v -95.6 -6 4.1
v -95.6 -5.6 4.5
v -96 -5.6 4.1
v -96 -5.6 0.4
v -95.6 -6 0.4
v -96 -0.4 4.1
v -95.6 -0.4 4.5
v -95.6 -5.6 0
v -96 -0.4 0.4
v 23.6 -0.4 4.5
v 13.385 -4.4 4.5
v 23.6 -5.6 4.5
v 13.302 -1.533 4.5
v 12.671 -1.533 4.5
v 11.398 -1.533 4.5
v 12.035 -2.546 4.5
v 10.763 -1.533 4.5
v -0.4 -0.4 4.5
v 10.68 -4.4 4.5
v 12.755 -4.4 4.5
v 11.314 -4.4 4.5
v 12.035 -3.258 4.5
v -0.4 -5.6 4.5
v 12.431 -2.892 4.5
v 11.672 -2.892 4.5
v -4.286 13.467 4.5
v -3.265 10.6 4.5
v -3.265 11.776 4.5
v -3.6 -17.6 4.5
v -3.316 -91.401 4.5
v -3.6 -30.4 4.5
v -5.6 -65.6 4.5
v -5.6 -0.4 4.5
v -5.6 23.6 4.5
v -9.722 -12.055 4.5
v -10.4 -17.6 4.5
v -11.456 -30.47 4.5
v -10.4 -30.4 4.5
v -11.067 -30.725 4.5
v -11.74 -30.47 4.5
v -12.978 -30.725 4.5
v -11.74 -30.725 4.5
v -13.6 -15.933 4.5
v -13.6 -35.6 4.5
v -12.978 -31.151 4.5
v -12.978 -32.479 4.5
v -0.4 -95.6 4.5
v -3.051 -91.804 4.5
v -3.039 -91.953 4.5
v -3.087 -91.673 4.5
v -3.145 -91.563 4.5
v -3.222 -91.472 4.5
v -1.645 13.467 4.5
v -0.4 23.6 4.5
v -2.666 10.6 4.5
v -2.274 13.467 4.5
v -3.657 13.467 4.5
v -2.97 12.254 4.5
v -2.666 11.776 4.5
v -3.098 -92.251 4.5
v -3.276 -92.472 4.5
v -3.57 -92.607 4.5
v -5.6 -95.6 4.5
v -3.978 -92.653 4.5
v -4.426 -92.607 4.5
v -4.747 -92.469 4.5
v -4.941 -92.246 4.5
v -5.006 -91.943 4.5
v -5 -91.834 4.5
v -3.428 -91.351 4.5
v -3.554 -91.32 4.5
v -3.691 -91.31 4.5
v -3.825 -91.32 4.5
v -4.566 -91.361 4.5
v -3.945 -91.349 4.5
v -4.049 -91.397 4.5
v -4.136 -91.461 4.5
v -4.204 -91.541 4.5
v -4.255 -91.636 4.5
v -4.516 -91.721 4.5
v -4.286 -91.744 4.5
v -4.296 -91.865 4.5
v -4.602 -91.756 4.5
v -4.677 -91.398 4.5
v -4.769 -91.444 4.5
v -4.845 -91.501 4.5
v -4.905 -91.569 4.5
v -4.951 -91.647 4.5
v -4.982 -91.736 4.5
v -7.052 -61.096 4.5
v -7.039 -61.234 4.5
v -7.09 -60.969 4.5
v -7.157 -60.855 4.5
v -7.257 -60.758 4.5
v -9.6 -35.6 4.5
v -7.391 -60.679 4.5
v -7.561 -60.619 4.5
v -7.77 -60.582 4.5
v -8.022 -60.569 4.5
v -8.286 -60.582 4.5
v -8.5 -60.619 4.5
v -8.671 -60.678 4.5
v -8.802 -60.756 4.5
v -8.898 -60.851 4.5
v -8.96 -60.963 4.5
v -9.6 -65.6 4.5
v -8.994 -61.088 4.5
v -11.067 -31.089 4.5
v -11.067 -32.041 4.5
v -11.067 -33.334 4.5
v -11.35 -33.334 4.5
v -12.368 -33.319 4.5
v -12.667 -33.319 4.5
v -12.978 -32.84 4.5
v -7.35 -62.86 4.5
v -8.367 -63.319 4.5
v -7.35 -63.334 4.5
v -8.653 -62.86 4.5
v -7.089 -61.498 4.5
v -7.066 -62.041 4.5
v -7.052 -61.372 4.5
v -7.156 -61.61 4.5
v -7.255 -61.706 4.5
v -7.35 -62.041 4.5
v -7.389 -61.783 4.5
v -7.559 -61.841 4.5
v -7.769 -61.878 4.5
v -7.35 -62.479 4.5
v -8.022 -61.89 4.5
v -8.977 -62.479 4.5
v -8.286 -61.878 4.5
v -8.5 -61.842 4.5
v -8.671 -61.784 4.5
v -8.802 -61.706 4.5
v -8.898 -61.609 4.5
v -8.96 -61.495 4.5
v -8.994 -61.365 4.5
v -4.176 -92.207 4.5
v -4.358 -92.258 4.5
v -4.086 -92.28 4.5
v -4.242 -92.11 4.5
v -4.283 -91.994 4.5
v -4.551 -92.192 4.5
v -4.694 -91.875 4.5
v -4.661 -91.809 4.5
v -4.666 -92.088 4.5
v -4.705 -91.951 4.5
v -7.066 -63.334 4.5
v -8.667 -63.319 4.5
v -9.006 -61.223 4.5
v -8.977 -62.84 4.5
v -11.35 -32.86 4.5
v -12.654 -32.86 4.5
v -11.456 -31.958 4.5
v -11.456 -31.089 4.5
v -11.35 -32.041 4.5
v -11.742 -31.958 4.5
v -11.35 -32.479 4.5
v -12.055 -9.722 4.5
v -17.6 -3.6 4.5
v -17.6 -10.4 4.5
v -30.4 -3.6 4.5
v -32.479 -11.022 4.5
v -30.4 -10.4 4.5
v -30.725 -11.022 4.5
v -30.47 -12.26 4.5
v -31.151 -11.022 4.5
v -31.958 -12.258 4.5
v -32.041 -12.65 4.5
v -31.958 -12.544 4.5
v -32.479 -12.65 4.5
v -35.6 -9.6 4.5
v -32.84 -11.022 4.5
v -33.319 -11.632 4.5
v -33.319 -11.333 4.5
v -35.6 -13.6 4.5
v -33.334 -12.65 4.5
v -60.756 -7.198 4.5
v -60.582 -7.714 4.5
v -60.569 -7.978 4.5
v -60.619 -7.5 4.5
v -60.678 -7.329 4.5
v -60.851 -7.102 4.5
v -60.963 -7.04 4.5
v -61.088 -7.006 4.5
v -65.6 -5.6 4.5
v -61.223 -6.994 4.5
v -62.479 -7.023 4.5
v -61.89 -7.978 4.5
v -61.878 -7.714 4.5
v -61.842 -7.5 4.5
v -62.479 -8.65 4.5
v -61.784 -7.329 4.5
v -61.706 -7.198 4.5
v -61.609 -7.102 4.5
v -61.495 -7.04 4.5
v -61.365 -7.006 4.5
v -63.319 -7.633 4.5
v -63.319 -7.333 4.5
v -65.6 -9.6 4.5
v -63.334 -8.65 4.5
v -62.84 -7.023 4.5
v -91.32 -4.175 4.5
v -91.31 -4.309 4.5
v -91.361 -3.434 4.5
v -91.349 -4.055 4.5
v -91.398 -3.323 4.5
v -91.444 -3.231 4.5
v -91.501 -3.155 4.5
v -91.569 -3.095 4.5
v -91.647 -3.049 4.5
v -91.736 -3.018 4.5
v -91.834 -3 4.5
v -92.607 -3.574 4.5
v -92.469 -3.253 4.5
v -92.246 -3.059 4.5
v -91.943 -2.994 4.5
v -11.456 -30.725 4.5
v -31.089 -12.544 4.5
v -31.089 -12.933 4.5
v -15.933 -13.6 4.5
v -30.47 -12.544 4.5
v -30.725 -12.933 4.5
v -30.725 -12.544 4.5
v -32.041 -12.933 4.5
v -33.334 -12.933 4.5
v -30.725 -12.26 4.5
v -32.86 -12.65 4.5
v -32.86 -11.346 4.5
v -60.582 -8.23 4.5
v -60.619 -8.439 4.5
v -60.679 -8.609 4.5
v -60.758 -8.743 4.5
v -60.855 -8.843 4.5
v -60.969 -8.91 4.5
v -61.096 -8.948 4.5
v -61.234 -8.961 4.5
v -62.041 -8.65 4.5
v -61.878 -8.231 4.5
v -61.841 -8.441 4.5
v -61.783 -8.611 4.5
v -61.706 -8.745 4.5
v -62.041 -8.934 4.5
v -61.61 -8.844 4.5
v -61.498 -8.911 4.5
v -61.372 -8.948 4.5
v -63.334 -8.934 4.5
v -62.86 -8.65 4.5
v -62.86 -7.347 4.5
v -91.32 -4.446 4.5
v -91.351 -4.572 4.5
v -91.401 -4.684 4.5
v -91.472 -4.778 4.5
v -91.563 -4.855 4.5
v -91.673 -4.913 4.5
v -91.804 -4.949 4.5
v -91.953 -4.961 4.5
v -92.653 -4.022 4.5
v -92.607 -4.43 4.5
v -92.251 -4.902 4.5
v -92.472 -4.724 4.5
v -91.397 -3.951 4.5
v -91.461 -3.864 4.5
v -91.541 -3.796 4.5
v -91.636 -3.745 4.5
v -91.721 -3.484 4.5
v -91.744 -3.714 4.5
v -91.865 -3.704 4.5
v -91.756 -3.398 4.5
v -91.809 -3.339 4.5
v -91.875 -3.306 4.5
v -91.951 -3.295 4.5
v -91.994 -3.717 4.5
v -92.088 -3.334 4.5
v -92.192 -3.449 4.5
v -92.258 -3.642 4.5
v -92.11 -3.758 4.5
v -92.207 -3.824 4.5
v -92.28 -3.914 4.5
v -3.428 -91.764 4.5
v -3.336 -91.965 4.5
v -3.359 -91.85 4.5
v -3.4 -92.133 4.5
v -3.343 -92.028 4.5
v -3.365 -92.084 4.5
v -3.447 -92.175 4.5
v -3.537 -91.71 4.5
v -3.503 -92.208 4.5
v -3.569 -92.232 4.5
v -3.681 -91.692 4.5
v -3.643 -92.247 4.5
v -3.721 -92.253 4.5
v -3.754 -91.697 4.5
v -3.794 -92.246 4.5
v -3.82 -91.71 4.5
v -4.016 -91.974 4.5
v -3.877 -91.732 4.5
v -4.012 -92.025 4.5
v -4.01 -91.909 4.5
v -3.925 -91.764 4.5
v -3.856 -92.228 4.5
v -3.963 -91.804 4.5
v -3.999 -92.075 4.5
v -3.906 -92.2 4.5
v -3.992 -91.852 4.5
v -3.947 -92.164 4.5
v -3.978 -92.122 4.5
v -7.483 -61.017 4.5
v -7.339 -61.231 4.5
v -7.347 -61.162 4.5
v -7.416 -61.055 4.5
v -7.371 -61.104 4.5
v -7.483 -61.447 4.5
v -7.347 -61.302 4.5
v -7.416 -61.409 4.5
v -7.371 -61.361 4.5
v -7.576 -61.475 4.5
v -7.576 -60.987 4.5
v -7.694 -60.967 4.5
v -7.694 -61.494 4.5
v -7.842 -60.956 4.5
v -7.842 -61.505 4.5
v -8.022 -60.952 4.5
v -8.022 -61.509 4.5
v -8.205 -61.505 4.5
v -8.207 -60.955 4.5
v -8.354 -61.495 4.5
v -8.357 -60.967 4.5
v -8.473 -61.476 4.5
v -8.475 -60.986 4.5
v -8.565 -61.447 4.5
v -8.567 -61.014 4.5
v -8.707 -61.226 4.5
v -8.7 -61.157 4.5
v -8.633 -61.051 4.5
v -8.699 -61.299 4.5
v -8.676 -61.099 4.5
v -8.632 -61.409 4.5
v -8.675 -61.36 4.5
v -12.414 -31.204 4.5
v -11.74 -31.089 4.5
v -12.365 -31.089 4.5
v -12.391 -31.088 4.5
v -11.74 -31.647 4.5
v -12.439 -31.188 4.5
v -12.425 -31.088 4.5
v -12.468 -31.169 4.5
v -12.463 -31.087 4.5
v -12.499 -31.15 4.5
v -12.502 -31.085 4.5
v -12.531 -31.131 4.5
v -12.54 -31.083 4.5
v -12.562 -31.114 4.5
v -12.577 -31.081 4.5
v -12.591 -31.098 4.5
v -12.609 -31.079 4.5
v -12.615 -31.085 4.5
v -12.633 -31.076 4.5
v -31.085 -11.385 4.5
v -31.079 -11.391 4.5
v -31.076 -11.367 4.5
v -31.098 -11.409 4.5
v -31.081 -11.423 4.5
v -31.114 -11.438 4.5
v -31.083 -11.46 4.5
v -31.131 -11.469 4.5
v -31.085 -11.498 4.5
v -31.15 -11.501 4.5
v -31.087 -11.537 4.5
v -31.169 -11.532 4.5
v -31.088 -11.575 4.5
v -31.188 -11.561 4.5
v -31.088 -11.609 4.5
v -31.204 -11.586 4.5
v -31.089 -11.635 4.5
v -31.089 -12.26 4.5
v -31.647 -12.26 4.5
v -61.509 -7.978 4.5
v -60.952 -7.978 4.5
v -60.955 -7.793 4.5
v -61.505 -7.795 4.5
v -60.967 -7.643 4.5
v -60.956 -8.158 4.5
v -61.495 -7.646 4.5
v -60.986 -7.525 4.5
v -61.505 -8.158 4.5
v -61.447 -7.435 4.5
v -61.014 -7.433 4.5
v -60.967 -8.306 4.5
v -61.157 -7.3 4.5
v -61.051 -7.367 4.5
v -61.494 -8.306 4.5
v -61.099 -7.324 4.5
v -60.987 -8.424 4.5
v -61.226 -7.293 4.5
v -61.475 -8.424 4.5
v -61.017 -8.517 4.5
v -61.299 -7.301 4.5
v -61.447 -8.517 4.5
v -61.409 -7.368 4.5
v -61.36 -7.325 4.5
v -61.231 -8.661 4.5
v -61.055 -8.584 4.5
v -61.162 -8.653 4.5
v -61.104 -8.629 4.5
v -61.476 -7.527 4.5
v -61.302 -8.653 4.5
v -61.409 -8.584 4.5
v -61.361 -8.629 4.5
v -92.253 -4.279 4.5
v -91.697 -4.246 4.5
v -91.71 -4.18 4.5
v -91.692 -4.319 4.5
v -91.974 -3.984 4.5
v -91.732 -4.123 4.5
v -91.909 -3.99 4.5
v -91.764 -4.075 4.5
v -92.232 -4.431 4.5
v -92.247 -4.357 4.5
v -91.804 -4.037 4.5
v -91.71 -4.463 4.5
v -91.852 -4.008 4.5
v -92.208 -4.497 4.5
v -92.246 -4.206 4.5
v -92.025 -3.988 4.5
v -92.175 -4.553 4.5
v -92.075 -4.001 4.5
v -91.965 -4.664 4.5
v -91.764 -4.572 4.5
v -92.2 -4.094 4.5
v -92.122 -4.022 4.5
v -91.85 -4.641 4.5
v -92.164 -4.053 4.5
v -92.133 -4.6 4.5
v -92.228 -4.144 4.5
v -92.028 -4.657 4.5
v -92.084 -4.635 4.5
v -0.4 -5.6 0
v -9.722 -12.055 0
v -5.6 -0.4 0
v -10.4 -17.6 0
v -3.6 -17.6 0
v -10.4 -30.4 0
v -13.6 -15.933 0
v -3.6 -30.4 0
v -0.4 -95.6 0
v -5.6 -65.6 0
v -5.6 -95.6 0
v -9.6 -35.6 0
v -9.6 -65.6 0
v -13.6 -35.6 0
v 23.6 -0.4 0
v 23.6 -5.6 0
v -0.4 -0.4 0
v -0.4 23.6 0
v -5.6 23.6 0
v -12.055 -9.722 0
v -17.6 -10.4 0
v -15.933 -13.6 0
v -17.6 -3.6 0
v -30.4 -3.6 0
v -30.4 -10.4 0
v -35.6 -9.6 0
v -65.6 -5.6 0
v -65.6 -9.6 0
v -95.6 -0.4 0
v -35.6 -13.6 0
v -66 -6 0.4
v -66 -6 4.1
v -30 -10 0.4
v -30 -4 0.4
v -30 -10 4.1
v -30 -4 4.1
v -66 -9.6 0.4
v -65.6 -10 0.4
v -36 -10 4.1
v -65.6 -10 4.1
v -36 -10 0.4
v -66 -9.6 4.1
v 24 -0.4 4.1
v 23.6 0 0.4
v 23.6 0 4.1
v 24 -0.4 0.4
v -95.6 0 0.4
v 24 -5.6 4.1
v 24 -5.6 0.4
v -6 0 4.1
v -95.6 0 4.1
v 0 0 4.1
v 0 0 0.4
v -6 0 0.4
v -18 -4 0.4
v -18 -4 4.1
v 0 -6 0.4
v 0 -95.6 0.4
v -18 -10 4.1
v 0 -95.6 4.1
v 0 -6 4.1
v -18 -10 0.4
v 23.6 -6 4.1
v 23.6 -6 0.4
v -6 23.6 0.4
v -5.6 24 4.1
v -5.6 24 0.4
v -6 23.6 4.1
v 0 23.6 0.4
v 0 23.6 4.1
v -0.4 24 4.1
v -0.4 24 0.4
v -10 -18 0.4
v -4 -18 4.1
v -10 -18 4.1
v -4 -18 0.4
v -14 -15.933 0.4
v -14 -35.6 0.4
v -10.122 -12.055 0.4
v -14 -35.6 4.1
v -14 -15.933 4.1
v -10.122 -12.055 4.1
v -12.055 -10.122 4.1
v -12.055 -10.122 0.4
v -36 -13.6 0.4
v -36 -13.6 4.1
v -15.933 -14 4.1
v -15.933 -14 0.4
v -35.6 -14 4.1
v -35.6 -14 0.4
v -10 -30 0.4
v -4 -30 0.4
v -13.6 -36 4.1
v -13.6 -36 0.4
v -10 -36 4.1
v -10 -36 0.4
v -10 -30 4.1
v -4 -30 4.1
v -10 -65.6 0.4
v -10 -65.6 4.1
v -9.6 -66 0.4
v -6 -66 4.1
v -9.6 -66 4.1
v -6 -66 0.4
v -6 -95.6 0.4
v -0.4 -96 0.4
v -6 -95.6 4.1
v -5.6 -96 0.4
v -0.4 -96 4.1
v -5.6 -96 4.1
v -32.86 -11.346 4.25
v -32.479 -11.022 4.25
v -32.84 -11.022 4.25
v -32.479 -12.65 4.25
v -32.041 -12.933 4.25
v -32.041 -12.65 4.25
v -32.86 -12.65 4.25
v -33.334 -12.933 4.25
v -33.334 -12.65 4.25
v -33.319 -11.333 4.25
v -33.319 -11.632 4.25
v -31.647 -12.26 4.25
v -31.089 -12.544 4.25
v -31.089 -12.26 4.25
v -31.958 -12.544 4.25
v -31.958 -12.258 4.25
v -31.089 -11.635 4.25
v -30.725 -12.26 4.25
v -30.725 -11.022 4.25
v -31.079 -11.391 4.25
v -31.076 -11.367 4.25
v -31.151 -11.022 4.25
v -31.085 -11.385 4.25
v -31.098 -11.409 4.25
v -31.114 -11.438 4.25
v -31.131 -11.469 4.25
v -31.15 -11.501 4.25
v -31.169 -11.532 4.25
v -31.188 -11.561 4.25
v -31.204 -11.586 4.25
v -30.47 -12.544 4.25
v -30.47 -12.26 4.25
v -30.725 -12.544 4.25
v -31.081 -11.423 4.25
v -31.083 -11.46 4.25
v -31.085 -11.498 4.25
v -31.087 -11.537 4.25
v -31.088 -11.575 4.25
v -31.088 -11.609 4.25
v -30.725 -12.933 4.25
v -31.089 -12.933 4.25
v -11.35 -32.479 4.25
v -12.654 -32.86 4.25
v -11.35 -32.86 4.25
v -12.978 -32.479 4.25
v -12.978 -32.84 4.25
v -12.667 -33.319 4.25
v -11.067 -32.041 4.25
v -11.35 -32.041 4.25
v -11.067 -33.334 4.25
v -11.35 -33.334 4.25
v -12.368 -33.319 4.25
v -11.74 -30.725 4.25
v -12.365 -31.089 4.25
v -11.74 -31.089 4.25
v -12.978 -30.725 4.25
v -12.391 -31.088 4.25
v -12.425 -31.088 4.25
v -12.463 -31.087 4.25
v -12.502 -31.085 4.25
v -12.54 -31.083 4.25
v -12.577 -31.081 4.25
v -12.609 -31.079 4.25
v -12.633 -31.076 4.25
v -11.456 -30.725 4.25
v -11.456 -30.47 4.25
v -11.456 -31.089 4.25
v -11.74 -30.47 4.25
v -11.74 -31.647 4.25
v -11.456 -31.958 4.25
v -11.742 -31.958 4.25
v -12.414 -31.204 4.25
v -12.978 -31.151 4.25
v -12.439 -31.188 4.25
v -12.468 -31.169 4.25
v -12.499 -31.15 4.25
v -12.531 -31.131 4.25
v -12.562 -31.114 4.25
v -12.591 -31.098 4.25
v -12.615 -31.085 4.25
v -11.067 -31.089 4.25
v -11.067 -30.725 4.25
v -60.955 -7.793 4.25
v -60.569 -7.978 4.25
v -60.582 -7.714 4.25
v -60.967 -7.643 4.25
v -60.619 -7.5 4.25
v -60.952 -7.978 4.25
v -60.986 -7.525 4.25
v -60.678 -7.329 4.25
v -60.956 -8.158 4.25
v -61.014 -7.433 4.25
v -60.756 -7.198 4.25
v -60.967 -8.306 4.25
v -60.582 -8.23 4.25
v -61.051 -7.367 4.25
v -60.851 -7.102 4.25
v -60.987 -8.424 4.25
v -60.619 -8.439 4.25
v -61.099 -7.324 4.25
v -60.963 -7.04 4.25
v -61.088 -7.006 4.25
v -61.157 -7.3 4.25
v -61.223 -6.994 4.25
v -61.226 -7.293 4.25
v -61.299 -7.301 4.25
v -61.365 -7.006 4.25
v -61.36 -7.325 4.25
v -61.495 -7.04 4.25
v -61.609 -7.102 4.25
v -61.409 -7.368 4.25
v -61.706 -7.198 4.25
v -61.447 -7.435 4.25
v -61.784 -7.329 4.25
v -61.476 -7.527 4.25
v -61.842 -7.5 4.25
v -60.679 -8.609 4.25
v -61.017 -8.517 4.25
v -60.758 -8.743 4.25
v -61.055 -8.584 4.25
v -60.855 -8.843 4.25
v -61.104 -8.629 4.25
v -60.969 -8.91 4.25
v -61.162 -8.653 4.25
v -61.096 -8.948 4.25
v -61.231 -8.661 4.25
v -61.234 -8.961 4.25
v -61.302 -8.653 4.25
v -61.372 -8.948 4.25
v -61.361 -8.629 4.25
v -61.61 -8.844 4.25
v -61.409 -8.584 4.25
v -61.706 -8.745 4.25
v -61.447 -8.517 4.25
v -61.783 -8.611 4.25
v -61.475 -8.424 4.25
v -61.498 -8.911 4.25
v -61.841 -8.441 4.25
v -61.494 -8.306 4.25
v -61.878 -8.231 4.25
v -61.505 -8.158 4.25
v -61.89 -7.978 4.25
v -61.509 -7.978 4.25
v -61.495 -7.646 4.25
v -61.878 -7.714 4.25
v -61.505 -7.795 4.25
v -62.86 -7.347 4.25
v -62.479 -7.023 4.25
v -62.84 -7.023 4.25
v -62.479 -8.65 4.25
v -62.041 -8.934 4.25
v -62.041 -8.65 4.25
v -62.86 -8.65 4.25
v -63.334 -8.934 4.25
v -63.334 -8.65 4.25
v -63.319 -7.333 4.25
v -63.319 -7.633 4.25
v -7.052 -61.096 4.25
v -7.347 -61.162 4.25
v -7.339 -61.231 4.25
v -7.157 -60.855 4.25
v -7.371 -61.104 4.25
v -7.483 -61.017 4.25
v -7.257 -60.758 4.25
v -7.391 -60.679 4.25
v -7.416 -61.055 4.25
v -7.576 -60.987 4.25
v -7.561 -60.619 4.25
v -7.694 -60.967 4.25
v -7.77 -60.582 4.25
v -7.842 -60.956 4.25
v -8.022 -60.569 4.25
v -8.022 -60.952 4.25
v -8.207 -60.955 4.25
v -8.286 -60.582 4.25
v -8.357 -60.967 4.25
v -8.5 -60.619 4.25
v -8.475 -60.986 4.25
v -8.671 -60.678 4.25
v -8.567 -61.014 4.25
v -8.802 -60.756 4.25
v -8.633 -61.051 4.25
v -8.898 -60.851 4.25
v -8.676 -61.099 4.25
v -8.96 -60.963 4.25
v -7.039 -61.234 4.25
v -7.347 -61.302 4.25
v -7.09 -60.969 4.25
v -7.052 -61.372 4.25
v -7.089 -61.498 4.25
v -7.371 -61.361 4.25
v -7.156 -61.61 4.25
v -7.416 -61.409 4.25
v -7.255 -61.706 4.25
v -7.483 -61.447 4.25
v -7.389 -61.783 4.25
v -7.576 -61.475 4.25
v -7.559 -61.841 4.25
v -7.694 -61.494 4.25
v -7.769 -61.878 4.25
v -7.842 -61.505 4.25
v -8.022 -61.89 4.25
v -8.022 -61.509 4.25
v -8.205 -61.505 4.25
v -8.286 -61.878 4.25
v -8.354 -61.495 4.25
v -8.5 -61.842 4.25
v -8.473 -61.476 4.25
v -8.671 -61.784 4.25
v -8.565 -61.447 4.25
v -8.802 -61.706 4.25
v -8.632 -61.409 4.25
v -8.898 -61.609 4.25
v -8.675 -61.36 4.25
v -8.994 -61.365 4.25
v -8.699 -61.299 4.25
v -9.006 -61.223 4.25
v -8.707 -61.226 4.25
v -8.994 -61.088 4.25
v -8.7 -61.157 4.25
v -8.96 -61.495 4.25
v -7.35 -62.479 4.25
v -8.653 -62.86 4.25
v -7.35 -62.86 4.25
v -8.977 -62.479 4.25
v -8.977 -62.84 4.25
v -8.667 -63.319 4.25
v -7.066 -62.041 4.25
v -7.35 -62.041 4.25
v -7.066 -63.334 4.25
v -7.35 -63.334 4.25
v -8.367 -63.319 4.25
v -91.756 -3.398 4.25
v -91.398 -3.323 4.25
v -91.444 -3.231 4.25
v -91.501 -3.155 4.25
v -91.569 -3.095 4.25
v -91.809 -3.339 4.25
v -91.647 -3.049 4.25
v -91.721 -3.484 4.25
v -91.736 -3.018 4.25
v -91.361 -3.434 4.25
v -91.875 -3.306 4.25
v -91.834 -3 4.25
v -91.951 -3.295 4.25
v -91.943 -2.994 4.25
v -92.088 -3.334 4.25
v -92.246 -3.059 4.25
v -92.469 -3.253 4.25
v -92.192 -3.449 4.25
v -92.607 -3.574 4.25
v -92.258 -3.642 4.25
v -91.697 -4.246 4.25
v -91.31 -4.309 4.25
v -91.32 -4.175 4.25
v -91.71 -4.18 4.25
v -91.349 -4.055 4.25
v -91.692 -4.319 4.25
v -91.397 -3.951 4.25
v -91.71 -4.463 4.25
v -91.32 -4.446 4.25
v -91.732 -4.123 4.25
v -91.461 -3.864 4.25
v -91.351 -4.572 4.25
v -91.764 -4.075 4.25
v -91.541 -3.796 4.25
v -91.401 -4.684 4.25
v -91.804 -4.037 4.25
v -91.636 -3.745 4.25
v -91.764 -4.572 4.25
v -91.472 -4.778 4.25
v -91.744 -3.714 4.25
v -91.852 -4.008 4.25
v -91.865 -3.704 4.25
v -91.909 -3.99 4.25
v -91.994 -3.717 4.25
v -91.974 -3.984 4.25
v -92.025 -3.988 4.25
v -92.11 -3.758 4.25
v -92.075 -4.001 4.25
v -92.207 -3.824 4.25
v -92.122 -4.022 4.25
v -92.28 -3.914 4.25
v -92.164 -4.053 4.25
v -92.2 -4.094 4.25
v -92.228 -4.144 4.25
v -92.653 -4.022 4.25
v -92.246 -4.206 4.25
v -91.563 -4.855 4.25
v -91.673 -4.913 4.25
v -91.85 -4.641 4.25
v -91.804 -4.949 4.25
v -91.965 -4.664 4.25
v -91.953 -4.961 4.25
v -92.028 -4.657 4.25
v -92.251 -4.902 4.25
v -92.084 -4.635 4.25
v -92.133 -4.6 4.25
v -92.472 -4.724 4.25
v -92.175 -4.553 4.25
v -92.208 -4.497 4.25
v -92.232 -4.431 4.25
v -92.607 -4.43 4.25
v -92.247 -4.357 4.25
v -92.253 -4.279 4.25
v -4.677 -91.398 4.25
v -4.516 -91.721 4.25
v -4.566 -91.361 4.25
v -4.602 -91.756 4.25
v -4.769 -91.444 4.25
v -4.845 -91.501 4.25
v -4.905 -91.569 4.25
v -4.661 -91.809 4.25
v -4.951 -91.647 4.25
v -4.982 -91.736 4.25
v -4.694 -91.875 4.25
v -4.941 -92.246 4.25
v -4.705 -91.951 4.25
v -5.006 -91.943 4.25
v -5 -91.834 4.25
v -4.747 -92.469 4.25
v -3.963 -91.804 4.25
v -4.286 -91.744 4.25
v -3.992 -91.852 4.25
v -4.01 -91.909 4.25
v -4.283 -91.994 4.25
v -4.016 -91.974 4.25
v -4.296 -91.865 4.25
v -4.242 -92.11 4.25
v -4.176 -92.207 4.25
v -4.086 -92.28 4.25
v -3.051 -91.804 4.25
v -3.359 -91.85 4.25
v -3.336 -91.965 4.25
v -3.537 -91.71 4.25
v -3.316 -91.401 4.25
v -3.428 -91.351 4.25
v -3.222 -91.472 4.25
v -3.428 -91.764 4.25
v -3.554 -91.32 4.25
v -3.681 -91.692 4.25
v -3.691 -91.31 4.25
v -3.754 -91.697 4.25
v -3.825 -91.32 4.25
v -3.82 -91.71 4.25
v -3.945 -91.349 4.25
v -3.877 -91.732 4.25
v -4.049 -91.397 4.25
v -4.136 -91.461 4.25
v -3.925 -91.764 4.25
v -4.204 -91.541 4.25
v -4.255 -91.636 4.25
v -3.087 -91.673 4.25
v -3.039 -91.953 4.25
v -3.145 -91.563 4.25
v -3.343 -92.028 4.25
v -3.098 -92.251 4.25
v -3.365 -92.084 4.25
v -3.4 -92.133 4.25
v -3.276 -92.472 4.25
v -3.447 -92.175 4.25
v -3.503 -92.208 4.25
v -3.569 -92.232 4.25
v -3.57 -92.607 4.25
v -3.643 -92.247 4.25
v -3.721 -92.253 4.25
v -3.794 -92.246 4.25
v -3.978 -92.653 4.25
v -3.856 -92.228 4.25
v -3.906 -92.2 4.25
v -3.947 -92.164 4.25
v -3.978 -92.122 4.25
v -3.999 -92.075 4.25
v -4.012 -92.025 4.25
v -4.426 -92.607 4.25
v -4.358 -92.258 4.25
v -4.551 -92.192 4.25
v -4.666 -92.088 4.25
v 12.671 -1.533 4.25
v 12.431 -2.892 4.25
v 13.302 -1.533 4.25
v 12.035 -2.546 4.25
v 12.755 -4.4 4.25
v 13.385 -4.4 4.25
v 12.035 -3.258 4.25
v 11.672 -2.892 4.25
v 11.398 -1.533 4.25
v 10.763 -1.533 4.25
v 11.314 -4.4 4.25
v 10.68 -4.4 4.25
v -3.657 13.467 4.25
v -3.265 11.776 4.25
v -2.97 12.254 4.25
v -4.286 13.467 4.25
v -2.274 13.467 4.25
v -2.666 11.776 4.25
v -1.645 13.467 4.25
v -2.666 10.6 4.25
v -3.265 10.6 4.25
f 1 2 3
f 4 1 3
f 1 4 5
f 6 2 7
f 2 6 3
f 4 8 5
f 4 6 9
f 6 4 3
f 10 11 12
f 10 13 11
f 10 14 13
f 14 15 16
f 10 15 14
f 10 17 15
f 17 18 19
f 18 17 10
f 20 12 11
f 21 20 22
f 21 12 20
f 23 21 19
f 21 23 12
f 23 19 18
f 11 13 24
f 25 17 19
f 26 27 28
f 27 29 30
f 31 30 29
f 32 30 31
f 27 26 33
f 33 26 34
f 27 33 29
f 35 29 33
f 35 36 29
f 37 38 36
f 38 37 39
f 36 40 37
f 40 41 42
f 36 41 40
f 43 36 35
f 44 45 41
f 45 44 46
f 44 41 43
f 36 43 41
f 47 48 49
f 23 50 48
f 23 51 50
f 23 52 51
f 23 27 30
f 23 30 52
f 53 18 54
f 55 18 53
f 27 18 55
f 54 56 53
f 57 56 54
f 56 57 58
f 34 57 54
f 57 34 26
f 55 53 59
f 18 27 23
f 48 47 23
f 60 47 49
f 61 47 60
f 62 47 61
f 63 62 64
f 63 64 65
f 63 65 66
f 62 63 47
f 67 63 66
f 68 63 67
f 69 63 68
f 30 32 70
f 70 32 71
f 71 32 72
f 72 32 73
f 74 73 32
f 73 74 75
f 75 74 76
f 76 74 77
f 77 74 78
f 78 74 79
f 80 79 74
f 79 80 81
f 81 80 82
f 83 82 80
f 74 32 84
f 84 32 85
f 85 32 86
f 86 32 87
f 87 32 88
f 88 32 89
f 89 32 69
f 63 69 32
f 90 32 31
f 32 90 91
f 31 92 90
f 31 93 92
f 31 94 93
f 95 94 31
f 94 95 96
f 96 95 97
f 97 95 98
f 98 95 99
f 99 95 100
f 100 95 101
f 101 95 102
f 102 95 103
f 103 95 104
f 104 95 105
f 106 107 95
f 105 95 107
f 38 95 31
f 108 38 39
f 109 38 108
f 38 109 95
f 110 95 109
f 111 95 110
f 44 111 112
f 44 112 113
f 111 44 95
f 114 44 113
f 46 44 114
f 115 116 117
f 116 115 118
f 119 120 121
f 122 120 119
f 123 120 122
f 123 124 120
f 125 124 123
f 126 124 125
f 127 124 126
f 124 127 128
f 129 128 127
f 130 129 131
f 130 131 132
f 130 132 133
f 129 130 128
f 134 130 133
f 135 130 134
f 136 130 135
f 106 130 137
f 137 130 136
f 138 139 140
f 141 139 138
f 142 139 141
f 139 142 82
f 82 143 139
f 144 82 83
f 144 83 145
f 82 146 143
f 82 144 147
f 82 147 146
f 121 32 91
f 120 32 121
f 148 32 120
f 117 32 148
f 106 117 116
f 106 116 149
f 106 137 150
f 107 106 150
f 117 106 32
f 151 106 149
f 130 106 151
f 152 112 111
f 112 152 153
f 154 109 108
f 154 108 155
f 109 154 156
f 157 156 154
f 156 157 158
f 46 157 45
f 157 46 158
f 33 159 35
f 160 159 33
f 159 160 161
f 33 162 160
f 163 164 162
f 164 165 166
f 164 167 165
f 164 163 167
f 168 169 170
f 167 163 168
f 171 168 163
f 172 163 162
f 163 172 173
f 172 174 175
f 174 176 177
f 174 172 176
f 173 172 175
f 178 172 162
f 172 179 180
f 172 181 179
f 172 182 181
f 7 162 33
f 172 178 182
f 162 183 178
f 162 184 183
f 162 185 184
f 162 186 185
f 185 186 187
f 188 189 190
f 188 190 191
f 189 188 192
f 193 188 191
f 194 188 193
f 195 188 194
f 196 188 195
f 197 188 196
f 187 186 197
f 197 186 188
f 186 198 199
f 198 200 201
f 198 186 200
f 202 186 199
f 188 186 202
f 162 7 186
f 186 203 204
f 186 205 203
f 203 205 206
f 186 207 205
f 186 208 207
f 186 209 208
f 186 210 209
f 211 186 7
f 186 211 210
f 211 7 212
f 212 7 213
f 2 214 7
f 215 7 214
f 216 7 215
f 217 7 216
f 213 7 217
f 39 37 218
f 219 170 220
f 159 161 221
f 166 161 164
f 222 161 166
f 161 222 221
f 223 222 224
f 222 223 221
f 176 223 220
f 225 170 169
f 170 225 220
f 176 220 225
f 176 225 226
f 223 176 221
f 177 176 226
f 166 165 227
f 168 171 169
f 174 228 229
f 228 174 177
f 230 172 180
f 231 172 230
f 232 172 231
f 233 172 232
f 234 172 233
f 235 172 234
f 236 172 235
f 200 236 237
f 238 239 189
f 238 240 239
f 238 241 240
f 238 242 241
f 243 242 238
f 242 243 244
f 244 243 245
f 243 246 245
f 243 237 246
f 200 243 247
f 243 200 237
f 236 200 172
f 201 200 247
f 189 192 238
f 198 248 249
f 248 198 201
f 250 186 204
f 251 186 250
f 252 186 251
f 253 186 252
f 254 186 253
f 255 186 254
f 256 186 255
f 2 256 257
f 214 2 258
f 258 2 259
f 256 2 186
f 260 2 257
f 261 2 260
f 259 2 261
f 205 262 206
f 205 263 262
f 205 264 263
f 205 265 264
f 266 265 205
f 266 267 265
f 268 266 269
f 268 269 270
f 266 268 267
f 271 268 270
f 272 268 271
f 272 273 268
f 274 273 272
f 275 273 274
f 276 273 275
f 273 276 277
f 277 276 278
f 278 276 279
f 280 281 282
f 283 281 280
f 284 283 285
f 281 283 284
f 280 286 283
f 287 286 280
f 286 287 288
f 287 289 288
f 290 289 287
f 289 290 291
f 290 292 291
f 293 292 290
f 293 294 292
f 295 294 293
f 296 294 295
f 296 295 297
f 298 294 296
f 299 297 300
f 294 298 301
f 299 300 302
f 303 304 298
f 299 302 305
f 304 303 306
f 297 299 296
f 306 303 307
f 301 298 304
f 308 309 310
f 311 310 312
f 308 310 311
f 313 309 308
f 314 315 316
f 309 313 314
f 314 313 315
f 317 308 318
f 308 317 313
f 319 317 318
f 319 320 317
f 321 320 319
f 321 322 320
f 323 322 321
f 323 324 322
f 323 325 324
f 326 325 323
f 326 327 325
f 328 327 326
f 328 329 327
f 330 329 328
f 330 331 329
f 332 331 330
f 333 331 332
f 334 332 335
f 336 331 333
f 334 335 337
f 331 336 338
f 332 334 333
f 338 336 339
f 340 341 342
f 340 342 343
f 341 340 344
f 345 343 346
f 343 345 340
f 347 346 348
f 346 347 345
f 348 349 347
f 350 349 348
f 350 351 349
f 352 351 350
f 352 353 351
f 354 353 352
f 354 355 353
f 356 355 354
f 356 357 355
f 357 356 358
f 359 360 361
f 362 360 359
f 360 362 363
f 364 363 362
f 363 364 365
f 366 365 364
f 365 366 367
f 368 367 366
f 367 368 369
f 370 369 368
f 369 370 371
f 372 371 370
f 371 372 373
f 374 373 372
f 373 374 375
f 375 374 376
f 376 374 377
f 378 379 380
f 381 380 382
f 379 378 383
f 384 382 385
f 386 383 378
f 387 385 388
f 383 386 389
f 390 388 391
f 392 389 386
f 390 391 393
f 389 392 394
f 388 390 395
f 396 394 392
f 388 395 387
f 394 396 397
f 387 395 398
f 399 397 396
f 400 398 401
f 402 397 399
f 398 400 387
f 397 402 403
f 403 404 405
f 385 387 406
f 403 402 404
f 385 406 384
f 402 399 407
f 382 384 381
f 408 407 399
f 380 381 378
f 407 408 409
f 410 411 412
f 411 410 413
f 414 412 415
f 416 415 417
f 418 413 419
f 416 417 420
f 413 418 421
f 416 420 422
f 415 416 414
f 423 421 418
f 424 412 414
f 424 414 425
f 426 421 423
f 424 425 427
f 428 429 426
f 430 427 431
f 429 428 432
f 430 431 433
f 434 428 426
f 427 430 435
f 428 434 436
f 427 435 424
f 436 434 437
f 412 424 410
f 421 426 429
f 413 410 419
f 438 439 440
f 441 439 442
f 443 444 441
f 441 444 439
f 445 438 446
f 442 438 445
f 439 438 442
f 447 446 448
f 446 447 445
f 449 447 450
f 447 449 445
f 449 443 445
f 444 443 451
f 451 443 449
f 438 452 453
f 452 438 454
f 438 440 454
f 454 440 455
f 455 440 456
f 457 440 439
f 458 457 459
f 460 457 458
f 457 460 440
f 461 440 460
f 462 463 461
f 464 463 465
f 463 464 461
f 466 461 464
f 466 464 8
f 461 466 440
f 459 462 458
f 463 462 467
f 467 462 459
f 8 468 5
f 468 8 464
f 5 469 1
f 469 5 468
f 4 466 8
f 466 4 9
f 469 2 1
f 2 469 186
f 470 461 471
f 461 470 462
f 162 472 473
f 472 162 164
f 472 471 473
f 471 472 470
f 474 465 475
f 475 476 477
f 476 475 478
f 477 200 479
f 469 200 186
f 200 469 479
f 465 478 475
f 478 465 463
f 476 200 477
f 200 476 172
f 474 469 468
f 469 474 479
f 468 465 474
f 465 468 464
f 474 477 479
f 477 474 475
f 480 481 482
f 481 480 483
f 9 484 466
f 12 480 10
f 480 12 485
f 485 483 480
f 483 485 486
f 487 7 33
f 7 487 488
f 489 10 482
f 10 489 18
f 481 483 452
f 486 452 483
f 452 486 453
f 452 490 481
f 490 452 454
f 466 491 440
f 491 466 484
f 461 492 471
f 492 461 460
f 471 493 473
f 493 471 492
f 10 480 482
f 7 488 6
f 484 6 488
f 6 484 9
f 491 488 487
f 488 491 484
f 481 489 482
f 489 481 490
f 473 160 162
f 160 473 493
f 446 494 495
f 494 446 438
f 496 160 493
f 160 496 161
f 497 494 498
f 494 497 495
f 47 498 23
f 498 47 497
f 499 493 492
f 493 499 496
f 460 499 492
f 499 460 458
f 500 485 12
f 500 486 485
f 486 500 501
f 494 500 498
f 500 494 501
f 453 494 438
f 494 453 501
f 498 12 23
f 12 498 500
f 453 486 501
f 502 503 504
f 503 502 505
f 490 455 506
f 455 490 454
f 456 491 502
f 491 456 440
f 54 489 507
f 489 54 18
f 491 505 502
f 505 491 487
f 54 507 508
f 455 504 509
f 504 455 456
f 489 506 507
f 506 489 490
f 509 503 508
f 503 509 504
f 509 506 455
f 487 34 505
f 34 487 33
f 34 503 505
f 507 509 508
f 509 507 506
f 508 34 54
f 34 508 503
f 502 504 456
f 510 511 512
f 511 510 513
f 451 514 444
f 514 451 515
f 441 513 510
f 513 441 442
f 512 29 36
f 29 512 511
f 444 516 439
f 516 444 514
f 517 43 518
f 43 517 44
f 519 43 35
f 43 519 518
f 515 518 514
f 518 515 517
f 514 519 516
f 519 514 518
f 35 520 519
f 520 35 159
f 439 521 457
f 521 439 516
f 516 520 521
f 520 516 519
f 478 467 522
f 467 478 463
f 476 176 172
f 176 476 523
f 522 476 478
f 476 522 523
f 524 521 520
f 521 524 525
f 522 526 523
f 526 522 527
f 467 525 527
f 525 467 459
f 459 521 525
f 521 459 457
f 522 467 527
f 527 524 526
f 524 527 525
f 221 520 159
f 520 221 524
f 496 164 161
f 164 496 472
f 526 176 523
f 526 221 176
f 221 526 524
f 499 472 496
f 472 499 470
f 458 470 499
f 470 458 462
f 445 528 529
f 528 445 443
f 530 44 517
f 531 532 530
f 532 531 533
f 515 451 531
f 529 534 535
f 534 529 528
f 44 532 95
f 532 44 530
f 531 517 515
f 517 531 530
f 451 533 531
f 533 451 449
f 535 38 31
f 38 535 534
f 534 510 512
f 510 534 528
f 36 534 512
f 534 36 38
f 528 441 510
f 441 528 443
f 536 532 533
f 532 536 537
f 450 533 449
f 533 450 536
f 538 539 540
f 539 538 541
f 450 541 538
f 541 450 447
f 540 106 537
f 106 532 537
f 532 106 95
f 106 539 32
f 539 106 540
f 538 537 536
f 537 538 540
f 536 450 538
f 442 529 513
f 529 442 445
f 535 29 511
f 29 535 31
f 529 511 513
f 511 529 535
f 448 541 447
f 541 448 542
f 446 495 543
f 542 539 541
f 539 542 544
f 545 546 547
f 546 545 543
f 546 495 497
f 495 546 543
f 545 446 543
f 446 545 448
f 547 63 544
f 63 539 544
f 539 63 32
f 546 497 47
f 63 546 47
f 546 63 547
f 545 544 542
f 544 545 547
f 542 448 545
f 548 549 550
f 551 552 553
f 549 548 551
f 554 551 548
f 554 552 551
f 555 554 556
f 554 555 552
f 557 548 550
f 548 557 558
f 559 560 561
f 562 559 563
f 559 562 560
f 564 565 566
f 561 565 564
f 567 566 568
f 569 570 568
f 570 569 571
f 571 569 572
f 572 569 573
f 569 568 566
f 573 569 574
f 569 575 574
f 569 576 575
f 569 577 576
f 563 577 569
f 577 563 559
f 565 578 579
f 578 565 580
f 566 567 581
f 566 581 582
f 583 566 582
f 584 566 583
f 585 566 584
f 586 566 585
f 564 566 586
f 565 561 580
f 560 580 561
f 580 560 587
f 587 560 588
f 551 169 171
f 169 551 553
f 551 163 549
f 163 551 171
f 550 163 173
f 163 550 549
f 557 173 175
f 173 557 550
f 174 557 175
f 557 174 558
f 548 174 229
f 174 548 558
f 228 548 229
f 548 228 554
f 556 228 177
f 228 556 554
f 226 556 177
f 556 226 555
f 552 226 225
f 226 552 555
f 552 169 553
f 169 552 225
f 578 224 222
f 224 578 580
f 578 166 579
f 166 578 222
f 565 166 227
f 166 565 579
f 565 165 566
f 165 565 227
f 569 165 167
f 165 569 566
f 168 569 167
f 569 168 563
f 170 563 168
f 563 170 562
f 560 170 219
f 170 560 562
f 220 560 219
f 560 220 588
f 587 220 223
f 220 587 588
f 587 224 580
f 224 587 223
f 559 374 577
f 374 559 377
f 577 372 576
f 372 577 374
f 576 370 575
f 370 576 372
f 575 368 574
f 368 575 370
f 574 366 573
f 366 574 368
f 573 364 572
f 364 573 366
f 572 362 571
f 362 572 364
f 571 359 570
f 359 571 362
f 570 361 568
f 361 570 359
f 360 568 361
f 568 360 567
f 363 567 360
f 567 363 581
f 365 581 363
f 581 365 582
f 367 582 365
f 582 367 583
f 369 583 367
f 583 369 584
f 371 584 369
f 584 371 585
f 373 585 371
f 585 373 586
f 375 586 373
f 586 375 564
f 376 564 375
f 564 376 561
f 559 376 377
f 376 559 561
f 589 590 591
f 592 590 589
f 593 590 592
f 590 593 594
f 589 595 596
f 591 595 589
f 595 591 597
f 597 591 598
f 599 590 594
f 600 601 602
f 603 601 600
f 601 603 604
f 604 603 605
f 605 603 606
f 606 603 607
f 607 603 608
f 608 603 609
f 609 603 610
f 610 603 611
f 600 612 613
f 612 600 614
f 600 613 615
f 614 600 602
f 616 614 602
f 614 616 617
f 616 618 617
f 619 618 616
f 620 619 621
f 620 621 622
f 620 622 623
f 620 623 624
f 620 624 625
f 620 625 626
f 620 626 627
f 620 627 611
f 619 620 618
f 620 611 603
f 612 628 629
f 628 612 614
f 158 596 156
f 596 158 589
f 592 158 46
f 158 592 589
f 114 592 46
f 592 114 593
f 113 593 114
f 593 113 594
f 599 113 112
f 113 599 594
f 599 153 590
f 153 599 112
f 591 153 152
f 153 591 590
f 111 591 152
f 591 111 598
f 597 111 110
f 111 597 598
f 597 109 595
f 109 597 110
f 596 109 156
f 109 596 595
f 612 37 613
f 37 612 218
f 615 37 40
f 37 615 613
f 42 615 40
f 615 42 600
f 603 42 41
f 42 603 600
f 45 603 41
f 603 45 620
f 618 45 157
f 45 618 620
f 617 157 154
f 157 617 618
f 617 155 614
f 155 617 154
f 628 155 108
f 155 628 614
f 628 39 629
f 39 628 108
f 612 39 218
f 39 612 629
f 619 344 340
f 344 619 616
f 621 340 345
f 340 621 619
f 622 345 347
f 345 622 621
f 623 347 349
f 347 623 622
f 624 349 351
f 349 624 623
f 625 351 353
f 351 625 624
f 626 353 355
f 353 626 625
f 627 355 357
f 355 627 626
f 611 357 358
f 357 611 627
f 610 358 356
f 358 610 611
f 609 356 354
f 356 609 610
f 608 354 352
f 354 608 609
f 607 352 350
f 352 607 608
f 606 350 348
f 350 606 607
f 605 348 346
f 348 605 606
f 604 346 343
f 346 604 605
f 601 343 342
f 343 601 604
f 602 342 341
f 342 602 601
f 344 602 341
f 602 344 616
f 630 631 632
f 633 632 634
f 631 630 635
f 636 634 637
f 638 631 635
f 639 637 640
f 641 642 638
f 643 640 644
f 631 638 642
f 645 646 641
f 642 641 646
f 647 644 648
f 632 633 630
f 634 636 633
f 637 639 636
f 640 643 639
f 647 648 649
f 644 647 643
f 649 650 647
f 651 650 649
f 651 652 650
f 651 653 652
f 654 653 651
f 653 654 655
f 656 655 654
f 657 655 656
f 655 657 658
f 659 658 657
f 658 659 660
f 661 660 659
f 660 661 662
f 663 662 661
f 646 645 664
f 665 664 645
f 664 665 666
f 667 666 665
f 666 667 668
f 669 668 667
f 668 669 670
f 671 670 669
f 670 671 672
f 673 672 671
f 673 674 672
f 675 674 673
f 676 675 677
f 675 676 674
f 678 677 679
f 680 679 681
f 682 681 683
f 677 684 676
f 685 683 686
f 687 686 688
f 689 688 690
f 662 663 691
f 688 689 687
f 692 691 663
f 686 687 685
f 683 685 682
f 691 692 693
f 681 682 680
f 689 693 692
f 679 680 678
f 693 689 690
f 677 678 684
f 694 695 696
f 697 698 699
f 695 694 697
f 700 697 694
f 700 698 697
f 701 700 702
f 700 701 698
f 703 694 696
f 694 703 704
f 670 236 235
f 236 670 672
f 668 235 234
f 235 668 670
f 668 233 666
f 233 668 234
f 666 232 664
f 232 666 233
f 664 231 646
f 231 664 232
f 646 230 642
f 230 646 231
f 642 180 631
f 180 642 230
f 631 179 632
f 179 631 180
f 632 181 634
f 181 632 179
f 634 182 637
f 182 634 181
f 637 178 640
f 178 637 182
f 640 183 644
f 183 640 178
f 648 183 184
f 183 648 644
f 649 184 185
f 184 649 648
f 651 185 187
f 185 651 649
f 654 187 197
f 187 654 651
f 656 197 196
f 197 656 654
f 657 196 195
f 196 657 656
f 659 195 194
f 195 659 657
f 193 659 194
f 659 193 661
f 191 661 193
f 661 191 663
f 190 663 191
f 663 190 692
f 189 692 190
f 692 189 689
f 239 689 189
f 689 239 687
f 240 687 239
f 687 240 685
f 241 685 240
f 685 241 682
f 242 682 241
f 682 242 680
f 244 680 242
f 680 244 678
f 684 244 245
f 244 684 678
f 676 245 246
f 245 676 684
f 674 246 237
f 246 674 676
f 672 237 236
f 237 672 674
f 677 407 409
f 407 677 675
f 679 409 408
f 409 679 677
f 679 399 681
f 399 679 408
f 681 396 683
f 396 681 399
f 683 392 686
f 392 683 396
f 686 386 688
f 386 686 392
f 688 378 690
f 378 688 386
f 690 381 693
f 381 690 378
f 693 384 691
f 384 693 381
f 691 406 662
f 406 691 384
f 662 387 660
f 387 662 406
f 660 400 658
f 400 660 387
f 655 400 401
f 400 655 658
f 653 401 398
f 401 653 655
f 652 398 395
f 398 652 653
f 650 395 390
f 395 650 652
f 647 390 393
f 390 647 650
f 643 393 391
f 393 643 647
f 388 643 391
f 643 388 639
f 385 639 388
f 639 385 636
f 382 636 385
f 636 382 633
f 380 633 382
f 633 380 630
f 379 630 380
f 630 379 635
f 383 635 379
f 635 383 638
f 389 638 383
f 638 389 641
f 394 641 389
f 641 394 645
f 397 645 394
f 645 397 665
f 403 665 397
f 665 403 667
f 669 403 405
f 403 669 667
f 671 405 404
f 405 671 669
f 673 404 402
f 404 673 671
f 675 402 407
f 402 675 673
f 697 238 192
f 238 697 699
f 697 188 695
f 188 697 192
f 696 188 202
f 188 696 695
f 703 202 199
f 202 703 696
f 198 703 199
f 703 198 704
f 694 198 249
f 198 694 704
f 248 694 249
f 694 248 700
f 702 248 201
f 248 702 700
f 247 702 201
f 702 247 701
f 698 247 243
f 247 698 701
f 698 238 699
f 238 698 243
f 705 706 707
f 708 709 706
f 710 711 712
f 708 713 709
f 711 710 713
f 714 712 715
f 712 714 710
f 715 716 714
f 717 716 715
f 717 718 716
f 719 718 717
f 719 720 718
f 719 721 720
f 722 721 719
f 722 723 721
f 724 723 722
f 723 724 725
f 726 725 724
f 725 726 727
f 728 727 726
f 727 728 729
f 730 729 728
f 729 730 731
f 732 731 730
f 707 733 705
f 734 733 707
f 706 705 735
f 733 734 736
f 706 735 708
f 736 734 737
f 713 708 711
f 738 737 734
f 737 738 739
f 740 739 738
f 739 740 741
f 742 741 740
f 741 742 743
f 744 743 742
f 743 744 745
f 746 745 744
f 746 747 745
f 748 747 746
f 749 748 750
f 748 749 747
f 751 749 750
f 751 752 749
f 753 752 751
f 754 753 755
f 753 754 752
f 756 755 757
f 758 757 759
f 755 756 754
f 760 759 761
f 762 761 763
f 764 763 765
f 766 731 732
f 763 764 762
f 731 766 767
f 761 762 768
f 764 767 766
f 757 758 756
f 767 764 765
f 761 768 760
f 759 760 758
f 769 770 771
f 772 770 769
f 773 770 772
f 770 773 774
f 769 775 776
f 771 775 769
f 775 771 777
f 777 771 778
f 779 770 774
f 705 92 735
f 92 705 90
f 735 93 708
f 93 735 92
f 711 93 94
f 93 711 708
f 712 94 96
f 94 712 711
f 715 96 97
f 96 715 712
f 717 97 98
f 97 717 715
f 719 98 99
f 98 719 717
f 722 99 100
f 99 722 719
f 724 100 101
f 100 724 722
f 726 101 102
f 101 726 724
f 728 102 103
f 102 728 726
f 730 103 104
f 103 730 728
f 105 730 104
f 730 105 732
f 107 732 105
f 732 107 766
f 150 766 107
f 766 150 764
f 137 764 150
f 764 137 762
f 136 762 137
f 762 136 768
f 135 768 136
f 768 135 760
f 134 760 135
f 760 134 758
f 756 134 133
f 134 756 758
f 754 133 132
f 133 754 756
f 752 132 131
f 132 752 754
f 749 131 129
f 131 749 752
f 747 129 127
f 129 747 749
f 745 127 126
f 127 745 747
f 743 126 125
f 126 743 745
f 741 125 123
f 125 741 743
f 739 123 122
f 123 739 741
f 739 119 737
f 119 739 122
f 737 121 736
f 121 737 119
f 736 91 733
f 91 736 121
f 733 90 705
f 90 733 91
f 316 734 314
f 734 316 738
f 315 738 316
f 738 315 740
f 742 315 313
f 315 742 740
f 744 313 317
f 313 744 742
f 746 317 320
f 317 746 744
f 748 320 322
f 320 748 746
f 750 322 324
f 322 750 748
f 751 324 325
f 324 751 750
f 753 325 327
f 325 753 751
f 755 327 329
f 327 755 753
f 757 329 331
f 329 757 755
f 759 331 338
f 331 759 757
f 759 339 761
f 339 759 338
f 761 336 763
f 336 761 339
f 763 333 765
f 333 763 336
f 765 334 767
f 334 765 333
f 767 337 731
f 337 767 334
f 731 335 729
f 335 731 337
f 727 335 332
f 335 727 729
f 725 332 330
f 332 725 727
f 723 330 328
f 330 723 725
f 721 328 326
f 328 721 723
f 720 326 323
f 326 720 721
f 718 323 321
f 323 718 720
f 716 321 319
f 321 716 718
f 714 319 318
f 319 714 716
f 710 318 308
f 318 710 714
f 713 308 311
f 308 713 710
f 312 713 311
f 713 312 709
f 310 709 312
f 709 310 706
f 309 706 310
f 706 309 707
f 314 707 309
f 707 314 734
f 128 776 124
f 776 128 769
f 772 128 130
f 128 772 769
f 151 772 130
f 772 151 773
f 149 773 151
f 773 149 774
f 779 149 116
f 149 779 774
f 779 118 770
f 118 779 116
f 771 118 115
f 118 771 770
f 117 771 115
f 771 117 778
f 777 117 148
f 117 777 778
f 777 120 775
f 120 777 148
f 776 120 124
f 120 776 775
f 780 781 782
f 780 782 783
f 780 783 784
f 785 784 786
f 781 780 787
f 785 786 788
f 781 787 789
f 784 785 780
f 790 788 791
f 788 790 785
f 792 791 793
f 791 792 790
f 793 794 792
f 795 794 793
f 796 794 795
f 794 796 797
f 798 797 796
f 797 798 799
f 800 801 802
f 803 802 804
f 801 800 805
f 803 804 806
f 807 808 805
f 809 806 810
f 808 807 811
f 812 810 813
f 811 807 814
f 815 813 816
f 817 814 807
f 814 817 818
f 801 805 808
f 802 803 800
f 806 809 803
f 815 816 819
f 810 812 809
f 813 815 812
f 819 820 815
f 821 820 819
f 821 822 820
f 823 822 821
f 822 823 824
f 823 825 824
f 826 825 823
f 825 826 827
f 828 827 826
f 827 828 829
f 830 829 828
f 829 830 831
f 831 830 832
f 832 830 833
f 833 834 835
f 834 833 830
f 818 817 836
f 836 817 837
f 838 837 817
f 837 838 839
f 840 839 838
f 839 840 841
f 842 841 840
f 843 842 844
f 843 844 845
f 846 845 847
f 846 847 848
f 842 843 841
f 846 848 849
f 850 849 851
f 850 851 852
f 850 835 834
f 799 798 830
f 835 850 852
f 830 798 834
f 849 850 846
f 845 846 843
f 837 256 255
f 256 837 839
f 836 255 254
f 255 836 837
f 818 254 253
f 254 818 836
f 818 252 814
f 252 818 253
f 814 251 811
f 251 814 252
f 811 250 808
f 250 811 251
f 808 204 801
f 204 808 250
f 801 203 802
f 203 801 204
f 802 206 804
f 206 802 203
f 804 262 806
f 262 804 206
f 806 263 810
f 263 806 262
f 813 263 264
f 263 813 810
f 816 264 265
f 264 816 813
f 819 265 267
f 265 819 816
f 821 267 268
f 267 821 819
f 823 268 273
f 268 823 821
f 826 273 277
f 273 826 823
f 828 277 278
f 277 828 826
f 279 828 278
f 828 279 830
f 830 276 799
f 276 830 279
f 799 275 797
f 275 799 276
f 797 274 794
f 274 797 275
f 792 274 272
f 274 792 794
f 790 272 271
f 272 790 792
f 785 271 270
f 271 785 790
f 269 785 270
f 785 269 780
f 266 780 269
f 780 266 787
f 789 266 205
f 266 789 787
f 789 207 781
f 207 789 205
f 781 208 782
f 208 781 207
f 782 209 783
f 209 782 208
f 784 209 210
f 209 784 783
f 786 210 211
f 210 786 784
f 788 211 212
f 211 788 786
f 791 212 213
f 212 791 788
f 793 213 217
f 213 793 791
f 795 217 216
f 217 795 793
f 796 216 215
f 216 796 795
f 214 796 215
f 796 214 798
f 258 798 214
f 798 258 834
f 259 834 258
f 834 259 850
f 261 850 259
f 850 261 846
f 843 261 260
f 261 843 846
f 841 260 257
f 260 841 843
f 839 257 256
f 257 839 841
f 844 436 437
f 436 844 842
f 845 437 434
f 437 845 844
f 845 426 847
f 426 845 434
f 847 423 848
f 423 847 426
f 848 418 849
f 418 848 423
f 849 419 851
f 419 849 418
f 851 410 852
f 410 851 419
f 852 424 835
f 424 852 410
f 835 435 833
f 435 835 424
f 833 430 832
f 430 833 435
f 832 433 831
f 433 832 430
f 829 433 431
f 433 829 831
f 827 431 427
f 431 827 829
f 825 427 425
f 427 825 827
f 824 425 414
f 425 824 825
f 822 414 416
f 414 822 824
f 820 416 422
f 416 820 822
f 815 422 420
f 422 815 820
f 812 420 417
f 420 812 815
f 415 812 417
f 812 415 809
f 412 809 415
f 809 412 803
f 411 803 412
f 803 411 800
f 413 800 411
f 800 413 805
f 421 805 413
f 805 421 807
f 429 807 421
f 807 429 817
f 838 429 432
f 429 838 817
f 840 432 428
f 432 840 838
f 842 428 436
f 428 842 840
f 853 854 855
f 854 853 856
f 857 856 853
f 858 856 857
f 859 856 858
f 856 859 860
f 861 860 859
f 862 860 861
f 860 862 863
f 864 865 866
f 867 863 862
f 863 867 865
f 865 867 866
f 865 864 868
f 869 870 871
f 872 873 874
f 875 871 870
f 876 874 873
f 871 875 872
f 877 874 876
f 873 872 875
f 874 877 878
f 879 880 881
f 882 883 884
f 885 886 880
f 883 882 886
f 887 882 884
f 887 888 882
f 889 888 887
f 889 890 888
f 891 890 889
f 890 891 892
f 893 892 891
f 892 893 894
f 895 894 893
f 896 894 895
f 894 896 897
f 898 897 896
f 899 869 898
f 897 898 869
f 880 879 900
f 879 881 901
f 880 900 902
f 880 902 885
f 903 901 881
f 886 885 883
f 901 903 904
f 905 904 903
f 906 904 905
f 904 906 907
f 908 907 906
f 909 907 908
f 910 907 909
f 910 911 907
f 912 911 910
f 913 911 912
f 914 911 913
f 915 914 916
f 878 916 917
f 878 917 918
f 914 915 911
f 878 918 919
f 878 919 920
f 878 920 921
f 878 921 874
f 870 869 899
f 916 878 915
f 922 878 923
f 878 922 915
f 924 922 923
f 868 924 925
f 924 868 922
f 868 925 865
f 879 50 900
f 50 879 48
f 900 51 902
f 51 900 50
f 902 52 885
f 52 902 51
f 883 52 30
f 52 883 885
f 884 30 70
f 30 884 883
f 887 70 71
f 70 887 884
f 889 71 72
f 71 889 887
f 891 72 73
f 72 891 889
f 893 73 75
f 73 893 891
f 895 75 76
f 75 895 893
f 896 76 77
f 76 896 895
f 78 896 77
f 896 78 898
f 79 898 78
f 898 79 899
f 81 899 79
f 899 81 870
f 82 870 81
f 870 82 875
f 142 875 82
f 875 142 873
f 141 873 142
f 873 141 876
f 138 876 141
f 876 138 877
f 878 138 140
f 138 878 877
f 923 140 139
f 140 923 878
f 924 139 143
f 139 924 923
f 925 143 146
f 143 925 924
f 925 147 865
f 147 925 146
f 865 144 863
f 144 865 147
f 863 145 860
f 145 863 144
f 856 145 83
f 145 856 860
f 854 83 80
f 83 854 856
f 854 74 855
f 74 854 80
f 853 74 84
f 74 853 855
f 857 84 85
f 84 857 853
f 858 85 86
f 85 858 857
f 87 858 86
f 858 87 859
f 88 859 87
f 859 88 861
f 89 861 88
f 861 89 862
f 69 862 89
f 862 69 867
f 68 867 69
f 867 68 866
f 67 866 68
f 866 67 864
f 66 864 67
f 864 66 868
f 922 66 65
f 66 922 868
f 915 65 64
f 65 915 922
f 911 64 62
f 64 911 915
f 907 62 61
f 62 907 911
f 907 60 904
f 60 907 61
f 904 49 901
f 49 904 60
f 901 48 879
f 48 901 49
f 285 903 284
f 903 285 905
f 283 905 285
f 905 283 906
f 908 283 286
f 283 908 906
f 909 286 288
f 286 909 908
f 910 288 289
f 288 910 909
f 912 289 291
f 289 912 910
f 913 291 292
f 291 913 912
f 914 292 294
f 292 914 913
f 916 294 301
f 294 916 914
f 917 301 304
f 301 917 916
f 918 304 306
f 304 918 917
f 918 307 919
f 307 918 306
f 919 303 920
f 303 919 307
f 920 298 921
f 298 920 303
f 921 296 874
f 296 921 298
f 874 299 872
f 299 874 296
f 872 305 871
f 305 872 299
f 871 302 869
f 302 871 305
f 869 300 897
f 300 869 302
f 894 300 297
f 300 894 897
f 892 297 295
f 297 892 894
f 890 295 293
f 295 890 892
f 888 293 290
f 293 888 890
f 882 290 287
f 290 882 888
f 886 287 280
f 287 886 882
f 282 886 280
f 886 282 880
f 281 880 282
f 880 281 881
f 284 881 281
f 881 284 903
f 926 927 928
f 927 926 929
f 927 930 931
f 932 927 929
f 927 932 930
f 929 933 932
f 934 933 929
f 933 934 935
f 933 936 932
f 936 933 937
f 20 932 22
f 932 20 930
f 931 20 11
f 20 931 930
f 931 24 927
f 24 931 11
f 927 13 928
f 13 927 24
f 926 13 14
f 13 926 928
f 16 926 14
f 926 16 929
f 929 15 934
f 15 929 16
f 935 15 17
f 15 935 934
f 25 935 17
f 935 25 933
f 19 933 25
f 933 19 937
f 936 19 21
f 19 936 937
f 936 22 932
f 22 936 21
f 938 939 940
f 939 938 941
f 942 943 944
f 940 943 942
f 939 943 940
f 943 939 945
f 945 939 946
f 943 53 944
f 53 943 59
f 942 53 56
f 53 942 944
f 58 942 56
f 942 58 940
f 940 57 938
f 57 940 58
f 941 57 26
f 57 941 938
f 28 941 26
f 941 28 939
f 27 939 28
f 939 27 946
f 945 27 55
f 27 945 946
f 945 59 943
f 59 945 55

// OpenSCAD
// SPDX-License-Identifier: AGPL-3.0-only
// Copyright (C) 2026 pOmelchenko
// Visual prototype v5. Asymmetric cross with a common straight probe side.
// Original construction inspired by the measurement principle of K3D/Sorkin.
// No imported model geometry. Units: mm; height is constant.

/* [Body] */
height = 4.5;
short_length = 24;
short_width = 6;
section_ends = [36, 66, 96];
x_arm_widths = [14, 10, 6];
y_arm_widths = [14, 10, 6];

/* [Local windows] */
windows_enabled = true;
window_start = 18;
window_length = 12;
window_width = 6;
window_edge_offset = 4;
minimum_web = 4;

/* [Seam pocket] */
// Short rectangular slot in the inside corner, with a flat blind end.
seam_pocket_enabled = true;
seam_pocket_width = 2.5;
seam_pocket_depth = 4;
seam_pocket_mouth = 2;

/* [Finish] */
edge_chamfer = 0.4;
labels_enabled = true;
label_depth = 0.25;
label_font = "Liberation Sans:style=Bold";

/* [Schematic depth gauge - preview only] */
show_depth_gauge = false;
// User-provided approximate distance, on the side bearing on the tip.
rod_to_sole_edge = 7;
other_sole_reach = 7;
rod_width = 1;
sole_thickness_z = 3;
probe_clearance = 0.5;

function last(a) = a[len(a)-1];
function begin(i) = i == 0 ? 0 : section_ends[i-1];
probe_lane = short_width - rod_to_sole_edge;

assert(len(section_ends) >= 1);
assert(height > 2 * edge_chamfer && edge_chamfer > 0);
assert(label_depth > 0 && label_depth < height - 2 * edge_chamfer);
assert(short_length > 0 && short_width > 2 * edge_chamfer);
assert(probe_lane + rod_width/2 <= -probe_clearance,
       "Terminal width must leave a clear lane for the rod beside the straight edge");
assert(sole_thickness_z <= height - 2 * edge_chamfer);
assert(rod_width > 0 && rod_width <= sole_thickness_z);
assert(other_sole_reach > rod_width/2);

module check_arm(widths, cross_width) {
    assert(len(widths) == len(section_ends));
    assert(last(widths) == short_width,
           "This preview uses the same 6 mm seating width on all four tips");
    for (i = [0 : len(section_ends)-1]) {
        assert(section_ends[i] > begin(i));
        assert(widths[i] > 2 * edge_chamfer);
        if (i > 0) assert(widths[i] <= widths[i-1]);
    }
    if (windows_enabled) {
        assert(window_edge_offset >= minimum_web);
        assert(window_width > 2 * edge_chamfer);
        assert(window_start >= cross_width + minimum_web);
        assert(window_start + window_length <= section_ends[0] - minimum_web);
        assert(window_edge_offset + window_width + minimum_web <= widths[0]);
    }
    children();
}

module transpose_xy() { mirror([1, -1, 0]) children(); }

module arm(widths) {
    union() {
        translate([-short_length, 0]) square([short_length, short_width]);
        for (i = [0 : len(section_ends)-1])
            translate([begin(i), 0]) square([section_ends[i]-begin(i), widths[i]]);
    }
}

module local_window() {
    translate([window_start, window_edge_offset]) square([window_length, window_width]);
}

module seam_pocket() {
    assert(seam_pocket_width > 2 * edge_chamfer);
    assert(seam_pocket_depth > 0 && seam_pocket_mouth > 0);
    assert(seam_pocket_depth + seam_pocket_width < min(x_arm_widths[0], y_arm_widths[0]));
    translate([y_arm_widths[0], x_arm_widths[0]])
        rotate(45)
            translate([-seam_pocket_depth, -seam_pocket_width/2])
                square([seam_pocket_depth + seam_pocket_mouth, seam_pocket_width]);
}

module outline() {
    difference() {
        union() {
            arm(x_arm_widths);
            transpose_xy() arm(y_arm_widths);
        }
        if (windows_enabled) {
            local_window();
            transpose_xy() local_window();
        }
        if (seam_pocket_enabled) seam_pocket();
    }
}

module octahedron(r) {
    polyhedron(
        points = [[r,0,0],[-r,0,0],[0,r,0],[0,-r,0],[0,0,r],[0,0,-r]],
        faces = [[0,2,4],[2,1,4],[1,3,4],[3,0,4],
                 [2,0,5],[1,2,5],[3,1,5],[0,3,5]], convexity = 2);
}

module body() {
    minkowski() {
        translate([0,0,edge_chamfer])
            linear_extrude(height = height - 2*edge_chamfer)
                offset(delta = -edge_chamfer) outline();
        octahedron(edge_chamfer);
    }
}

module engraving(value, p, angle=180, size=2) {
    translate([p[0],p[1],height-label_depth])
        linear_extrude(height=label_depth+0.05)
            rotate(angle)
                text(value,size=size,font=label_font,halign="center",valign="center");
}

module gauge() {
    difference() {
        body();
        if (labels_enabled) {
            engraving("X",[-short_length/2,short_width/2],180,3);
            engraving("Y",[short_width/2,-short_length/2],180,3);
            for (i = [0 : len(section_ends)-1]) {
                engraving(str(x_arm_widths[i]),[section_ends[i]-4,x_arm_widths[i]-2]);
                engraving(str(y_arm_widths[i]),[y_arm_widths[i]-2,section_ends[i]-4],270);
            }
        }
    }
}

module schematic_depth_gauge() {
    // Long X measurement: base at u=96, rod reaches transverse short arm u=6.
    // The full schematic sole extends from v=-8 to +6; its supported part
    // spans the whole terminal face v=0..6. Rod centre is v=-1.
    tip = last(section_ends);
    z0 = (height-sole_thickness_z)/2;
    color([0.18,0.4,0.85]) {
        translate([tip, probe_lane-other_sole_reach, z0])
            cube([2, rod_to_sole_edge+other_sole_reach, sole_thickness_z]);
        translate([tip+2, probe_lane-other_sole_reach+2, z0])
            cube([26, rod_to_sole_edge+other_sole_reach-4, sole_thickness_z]);
        translate([short_width, probe_lane-rod_width/2, (height-rod_width)/2])
            cube([tip-short_width,rod_width,rod_width]);
    }
}

check_arm(x_arm_widths, y_arm_widths[0])
check_arm(y_arm_widths, x_arm_widths[0])
rotate(180) {
    color([0.22,0.47,0.49]) gauge();
    if (show_depth_gauge) schematic_depth_gauge();
}
